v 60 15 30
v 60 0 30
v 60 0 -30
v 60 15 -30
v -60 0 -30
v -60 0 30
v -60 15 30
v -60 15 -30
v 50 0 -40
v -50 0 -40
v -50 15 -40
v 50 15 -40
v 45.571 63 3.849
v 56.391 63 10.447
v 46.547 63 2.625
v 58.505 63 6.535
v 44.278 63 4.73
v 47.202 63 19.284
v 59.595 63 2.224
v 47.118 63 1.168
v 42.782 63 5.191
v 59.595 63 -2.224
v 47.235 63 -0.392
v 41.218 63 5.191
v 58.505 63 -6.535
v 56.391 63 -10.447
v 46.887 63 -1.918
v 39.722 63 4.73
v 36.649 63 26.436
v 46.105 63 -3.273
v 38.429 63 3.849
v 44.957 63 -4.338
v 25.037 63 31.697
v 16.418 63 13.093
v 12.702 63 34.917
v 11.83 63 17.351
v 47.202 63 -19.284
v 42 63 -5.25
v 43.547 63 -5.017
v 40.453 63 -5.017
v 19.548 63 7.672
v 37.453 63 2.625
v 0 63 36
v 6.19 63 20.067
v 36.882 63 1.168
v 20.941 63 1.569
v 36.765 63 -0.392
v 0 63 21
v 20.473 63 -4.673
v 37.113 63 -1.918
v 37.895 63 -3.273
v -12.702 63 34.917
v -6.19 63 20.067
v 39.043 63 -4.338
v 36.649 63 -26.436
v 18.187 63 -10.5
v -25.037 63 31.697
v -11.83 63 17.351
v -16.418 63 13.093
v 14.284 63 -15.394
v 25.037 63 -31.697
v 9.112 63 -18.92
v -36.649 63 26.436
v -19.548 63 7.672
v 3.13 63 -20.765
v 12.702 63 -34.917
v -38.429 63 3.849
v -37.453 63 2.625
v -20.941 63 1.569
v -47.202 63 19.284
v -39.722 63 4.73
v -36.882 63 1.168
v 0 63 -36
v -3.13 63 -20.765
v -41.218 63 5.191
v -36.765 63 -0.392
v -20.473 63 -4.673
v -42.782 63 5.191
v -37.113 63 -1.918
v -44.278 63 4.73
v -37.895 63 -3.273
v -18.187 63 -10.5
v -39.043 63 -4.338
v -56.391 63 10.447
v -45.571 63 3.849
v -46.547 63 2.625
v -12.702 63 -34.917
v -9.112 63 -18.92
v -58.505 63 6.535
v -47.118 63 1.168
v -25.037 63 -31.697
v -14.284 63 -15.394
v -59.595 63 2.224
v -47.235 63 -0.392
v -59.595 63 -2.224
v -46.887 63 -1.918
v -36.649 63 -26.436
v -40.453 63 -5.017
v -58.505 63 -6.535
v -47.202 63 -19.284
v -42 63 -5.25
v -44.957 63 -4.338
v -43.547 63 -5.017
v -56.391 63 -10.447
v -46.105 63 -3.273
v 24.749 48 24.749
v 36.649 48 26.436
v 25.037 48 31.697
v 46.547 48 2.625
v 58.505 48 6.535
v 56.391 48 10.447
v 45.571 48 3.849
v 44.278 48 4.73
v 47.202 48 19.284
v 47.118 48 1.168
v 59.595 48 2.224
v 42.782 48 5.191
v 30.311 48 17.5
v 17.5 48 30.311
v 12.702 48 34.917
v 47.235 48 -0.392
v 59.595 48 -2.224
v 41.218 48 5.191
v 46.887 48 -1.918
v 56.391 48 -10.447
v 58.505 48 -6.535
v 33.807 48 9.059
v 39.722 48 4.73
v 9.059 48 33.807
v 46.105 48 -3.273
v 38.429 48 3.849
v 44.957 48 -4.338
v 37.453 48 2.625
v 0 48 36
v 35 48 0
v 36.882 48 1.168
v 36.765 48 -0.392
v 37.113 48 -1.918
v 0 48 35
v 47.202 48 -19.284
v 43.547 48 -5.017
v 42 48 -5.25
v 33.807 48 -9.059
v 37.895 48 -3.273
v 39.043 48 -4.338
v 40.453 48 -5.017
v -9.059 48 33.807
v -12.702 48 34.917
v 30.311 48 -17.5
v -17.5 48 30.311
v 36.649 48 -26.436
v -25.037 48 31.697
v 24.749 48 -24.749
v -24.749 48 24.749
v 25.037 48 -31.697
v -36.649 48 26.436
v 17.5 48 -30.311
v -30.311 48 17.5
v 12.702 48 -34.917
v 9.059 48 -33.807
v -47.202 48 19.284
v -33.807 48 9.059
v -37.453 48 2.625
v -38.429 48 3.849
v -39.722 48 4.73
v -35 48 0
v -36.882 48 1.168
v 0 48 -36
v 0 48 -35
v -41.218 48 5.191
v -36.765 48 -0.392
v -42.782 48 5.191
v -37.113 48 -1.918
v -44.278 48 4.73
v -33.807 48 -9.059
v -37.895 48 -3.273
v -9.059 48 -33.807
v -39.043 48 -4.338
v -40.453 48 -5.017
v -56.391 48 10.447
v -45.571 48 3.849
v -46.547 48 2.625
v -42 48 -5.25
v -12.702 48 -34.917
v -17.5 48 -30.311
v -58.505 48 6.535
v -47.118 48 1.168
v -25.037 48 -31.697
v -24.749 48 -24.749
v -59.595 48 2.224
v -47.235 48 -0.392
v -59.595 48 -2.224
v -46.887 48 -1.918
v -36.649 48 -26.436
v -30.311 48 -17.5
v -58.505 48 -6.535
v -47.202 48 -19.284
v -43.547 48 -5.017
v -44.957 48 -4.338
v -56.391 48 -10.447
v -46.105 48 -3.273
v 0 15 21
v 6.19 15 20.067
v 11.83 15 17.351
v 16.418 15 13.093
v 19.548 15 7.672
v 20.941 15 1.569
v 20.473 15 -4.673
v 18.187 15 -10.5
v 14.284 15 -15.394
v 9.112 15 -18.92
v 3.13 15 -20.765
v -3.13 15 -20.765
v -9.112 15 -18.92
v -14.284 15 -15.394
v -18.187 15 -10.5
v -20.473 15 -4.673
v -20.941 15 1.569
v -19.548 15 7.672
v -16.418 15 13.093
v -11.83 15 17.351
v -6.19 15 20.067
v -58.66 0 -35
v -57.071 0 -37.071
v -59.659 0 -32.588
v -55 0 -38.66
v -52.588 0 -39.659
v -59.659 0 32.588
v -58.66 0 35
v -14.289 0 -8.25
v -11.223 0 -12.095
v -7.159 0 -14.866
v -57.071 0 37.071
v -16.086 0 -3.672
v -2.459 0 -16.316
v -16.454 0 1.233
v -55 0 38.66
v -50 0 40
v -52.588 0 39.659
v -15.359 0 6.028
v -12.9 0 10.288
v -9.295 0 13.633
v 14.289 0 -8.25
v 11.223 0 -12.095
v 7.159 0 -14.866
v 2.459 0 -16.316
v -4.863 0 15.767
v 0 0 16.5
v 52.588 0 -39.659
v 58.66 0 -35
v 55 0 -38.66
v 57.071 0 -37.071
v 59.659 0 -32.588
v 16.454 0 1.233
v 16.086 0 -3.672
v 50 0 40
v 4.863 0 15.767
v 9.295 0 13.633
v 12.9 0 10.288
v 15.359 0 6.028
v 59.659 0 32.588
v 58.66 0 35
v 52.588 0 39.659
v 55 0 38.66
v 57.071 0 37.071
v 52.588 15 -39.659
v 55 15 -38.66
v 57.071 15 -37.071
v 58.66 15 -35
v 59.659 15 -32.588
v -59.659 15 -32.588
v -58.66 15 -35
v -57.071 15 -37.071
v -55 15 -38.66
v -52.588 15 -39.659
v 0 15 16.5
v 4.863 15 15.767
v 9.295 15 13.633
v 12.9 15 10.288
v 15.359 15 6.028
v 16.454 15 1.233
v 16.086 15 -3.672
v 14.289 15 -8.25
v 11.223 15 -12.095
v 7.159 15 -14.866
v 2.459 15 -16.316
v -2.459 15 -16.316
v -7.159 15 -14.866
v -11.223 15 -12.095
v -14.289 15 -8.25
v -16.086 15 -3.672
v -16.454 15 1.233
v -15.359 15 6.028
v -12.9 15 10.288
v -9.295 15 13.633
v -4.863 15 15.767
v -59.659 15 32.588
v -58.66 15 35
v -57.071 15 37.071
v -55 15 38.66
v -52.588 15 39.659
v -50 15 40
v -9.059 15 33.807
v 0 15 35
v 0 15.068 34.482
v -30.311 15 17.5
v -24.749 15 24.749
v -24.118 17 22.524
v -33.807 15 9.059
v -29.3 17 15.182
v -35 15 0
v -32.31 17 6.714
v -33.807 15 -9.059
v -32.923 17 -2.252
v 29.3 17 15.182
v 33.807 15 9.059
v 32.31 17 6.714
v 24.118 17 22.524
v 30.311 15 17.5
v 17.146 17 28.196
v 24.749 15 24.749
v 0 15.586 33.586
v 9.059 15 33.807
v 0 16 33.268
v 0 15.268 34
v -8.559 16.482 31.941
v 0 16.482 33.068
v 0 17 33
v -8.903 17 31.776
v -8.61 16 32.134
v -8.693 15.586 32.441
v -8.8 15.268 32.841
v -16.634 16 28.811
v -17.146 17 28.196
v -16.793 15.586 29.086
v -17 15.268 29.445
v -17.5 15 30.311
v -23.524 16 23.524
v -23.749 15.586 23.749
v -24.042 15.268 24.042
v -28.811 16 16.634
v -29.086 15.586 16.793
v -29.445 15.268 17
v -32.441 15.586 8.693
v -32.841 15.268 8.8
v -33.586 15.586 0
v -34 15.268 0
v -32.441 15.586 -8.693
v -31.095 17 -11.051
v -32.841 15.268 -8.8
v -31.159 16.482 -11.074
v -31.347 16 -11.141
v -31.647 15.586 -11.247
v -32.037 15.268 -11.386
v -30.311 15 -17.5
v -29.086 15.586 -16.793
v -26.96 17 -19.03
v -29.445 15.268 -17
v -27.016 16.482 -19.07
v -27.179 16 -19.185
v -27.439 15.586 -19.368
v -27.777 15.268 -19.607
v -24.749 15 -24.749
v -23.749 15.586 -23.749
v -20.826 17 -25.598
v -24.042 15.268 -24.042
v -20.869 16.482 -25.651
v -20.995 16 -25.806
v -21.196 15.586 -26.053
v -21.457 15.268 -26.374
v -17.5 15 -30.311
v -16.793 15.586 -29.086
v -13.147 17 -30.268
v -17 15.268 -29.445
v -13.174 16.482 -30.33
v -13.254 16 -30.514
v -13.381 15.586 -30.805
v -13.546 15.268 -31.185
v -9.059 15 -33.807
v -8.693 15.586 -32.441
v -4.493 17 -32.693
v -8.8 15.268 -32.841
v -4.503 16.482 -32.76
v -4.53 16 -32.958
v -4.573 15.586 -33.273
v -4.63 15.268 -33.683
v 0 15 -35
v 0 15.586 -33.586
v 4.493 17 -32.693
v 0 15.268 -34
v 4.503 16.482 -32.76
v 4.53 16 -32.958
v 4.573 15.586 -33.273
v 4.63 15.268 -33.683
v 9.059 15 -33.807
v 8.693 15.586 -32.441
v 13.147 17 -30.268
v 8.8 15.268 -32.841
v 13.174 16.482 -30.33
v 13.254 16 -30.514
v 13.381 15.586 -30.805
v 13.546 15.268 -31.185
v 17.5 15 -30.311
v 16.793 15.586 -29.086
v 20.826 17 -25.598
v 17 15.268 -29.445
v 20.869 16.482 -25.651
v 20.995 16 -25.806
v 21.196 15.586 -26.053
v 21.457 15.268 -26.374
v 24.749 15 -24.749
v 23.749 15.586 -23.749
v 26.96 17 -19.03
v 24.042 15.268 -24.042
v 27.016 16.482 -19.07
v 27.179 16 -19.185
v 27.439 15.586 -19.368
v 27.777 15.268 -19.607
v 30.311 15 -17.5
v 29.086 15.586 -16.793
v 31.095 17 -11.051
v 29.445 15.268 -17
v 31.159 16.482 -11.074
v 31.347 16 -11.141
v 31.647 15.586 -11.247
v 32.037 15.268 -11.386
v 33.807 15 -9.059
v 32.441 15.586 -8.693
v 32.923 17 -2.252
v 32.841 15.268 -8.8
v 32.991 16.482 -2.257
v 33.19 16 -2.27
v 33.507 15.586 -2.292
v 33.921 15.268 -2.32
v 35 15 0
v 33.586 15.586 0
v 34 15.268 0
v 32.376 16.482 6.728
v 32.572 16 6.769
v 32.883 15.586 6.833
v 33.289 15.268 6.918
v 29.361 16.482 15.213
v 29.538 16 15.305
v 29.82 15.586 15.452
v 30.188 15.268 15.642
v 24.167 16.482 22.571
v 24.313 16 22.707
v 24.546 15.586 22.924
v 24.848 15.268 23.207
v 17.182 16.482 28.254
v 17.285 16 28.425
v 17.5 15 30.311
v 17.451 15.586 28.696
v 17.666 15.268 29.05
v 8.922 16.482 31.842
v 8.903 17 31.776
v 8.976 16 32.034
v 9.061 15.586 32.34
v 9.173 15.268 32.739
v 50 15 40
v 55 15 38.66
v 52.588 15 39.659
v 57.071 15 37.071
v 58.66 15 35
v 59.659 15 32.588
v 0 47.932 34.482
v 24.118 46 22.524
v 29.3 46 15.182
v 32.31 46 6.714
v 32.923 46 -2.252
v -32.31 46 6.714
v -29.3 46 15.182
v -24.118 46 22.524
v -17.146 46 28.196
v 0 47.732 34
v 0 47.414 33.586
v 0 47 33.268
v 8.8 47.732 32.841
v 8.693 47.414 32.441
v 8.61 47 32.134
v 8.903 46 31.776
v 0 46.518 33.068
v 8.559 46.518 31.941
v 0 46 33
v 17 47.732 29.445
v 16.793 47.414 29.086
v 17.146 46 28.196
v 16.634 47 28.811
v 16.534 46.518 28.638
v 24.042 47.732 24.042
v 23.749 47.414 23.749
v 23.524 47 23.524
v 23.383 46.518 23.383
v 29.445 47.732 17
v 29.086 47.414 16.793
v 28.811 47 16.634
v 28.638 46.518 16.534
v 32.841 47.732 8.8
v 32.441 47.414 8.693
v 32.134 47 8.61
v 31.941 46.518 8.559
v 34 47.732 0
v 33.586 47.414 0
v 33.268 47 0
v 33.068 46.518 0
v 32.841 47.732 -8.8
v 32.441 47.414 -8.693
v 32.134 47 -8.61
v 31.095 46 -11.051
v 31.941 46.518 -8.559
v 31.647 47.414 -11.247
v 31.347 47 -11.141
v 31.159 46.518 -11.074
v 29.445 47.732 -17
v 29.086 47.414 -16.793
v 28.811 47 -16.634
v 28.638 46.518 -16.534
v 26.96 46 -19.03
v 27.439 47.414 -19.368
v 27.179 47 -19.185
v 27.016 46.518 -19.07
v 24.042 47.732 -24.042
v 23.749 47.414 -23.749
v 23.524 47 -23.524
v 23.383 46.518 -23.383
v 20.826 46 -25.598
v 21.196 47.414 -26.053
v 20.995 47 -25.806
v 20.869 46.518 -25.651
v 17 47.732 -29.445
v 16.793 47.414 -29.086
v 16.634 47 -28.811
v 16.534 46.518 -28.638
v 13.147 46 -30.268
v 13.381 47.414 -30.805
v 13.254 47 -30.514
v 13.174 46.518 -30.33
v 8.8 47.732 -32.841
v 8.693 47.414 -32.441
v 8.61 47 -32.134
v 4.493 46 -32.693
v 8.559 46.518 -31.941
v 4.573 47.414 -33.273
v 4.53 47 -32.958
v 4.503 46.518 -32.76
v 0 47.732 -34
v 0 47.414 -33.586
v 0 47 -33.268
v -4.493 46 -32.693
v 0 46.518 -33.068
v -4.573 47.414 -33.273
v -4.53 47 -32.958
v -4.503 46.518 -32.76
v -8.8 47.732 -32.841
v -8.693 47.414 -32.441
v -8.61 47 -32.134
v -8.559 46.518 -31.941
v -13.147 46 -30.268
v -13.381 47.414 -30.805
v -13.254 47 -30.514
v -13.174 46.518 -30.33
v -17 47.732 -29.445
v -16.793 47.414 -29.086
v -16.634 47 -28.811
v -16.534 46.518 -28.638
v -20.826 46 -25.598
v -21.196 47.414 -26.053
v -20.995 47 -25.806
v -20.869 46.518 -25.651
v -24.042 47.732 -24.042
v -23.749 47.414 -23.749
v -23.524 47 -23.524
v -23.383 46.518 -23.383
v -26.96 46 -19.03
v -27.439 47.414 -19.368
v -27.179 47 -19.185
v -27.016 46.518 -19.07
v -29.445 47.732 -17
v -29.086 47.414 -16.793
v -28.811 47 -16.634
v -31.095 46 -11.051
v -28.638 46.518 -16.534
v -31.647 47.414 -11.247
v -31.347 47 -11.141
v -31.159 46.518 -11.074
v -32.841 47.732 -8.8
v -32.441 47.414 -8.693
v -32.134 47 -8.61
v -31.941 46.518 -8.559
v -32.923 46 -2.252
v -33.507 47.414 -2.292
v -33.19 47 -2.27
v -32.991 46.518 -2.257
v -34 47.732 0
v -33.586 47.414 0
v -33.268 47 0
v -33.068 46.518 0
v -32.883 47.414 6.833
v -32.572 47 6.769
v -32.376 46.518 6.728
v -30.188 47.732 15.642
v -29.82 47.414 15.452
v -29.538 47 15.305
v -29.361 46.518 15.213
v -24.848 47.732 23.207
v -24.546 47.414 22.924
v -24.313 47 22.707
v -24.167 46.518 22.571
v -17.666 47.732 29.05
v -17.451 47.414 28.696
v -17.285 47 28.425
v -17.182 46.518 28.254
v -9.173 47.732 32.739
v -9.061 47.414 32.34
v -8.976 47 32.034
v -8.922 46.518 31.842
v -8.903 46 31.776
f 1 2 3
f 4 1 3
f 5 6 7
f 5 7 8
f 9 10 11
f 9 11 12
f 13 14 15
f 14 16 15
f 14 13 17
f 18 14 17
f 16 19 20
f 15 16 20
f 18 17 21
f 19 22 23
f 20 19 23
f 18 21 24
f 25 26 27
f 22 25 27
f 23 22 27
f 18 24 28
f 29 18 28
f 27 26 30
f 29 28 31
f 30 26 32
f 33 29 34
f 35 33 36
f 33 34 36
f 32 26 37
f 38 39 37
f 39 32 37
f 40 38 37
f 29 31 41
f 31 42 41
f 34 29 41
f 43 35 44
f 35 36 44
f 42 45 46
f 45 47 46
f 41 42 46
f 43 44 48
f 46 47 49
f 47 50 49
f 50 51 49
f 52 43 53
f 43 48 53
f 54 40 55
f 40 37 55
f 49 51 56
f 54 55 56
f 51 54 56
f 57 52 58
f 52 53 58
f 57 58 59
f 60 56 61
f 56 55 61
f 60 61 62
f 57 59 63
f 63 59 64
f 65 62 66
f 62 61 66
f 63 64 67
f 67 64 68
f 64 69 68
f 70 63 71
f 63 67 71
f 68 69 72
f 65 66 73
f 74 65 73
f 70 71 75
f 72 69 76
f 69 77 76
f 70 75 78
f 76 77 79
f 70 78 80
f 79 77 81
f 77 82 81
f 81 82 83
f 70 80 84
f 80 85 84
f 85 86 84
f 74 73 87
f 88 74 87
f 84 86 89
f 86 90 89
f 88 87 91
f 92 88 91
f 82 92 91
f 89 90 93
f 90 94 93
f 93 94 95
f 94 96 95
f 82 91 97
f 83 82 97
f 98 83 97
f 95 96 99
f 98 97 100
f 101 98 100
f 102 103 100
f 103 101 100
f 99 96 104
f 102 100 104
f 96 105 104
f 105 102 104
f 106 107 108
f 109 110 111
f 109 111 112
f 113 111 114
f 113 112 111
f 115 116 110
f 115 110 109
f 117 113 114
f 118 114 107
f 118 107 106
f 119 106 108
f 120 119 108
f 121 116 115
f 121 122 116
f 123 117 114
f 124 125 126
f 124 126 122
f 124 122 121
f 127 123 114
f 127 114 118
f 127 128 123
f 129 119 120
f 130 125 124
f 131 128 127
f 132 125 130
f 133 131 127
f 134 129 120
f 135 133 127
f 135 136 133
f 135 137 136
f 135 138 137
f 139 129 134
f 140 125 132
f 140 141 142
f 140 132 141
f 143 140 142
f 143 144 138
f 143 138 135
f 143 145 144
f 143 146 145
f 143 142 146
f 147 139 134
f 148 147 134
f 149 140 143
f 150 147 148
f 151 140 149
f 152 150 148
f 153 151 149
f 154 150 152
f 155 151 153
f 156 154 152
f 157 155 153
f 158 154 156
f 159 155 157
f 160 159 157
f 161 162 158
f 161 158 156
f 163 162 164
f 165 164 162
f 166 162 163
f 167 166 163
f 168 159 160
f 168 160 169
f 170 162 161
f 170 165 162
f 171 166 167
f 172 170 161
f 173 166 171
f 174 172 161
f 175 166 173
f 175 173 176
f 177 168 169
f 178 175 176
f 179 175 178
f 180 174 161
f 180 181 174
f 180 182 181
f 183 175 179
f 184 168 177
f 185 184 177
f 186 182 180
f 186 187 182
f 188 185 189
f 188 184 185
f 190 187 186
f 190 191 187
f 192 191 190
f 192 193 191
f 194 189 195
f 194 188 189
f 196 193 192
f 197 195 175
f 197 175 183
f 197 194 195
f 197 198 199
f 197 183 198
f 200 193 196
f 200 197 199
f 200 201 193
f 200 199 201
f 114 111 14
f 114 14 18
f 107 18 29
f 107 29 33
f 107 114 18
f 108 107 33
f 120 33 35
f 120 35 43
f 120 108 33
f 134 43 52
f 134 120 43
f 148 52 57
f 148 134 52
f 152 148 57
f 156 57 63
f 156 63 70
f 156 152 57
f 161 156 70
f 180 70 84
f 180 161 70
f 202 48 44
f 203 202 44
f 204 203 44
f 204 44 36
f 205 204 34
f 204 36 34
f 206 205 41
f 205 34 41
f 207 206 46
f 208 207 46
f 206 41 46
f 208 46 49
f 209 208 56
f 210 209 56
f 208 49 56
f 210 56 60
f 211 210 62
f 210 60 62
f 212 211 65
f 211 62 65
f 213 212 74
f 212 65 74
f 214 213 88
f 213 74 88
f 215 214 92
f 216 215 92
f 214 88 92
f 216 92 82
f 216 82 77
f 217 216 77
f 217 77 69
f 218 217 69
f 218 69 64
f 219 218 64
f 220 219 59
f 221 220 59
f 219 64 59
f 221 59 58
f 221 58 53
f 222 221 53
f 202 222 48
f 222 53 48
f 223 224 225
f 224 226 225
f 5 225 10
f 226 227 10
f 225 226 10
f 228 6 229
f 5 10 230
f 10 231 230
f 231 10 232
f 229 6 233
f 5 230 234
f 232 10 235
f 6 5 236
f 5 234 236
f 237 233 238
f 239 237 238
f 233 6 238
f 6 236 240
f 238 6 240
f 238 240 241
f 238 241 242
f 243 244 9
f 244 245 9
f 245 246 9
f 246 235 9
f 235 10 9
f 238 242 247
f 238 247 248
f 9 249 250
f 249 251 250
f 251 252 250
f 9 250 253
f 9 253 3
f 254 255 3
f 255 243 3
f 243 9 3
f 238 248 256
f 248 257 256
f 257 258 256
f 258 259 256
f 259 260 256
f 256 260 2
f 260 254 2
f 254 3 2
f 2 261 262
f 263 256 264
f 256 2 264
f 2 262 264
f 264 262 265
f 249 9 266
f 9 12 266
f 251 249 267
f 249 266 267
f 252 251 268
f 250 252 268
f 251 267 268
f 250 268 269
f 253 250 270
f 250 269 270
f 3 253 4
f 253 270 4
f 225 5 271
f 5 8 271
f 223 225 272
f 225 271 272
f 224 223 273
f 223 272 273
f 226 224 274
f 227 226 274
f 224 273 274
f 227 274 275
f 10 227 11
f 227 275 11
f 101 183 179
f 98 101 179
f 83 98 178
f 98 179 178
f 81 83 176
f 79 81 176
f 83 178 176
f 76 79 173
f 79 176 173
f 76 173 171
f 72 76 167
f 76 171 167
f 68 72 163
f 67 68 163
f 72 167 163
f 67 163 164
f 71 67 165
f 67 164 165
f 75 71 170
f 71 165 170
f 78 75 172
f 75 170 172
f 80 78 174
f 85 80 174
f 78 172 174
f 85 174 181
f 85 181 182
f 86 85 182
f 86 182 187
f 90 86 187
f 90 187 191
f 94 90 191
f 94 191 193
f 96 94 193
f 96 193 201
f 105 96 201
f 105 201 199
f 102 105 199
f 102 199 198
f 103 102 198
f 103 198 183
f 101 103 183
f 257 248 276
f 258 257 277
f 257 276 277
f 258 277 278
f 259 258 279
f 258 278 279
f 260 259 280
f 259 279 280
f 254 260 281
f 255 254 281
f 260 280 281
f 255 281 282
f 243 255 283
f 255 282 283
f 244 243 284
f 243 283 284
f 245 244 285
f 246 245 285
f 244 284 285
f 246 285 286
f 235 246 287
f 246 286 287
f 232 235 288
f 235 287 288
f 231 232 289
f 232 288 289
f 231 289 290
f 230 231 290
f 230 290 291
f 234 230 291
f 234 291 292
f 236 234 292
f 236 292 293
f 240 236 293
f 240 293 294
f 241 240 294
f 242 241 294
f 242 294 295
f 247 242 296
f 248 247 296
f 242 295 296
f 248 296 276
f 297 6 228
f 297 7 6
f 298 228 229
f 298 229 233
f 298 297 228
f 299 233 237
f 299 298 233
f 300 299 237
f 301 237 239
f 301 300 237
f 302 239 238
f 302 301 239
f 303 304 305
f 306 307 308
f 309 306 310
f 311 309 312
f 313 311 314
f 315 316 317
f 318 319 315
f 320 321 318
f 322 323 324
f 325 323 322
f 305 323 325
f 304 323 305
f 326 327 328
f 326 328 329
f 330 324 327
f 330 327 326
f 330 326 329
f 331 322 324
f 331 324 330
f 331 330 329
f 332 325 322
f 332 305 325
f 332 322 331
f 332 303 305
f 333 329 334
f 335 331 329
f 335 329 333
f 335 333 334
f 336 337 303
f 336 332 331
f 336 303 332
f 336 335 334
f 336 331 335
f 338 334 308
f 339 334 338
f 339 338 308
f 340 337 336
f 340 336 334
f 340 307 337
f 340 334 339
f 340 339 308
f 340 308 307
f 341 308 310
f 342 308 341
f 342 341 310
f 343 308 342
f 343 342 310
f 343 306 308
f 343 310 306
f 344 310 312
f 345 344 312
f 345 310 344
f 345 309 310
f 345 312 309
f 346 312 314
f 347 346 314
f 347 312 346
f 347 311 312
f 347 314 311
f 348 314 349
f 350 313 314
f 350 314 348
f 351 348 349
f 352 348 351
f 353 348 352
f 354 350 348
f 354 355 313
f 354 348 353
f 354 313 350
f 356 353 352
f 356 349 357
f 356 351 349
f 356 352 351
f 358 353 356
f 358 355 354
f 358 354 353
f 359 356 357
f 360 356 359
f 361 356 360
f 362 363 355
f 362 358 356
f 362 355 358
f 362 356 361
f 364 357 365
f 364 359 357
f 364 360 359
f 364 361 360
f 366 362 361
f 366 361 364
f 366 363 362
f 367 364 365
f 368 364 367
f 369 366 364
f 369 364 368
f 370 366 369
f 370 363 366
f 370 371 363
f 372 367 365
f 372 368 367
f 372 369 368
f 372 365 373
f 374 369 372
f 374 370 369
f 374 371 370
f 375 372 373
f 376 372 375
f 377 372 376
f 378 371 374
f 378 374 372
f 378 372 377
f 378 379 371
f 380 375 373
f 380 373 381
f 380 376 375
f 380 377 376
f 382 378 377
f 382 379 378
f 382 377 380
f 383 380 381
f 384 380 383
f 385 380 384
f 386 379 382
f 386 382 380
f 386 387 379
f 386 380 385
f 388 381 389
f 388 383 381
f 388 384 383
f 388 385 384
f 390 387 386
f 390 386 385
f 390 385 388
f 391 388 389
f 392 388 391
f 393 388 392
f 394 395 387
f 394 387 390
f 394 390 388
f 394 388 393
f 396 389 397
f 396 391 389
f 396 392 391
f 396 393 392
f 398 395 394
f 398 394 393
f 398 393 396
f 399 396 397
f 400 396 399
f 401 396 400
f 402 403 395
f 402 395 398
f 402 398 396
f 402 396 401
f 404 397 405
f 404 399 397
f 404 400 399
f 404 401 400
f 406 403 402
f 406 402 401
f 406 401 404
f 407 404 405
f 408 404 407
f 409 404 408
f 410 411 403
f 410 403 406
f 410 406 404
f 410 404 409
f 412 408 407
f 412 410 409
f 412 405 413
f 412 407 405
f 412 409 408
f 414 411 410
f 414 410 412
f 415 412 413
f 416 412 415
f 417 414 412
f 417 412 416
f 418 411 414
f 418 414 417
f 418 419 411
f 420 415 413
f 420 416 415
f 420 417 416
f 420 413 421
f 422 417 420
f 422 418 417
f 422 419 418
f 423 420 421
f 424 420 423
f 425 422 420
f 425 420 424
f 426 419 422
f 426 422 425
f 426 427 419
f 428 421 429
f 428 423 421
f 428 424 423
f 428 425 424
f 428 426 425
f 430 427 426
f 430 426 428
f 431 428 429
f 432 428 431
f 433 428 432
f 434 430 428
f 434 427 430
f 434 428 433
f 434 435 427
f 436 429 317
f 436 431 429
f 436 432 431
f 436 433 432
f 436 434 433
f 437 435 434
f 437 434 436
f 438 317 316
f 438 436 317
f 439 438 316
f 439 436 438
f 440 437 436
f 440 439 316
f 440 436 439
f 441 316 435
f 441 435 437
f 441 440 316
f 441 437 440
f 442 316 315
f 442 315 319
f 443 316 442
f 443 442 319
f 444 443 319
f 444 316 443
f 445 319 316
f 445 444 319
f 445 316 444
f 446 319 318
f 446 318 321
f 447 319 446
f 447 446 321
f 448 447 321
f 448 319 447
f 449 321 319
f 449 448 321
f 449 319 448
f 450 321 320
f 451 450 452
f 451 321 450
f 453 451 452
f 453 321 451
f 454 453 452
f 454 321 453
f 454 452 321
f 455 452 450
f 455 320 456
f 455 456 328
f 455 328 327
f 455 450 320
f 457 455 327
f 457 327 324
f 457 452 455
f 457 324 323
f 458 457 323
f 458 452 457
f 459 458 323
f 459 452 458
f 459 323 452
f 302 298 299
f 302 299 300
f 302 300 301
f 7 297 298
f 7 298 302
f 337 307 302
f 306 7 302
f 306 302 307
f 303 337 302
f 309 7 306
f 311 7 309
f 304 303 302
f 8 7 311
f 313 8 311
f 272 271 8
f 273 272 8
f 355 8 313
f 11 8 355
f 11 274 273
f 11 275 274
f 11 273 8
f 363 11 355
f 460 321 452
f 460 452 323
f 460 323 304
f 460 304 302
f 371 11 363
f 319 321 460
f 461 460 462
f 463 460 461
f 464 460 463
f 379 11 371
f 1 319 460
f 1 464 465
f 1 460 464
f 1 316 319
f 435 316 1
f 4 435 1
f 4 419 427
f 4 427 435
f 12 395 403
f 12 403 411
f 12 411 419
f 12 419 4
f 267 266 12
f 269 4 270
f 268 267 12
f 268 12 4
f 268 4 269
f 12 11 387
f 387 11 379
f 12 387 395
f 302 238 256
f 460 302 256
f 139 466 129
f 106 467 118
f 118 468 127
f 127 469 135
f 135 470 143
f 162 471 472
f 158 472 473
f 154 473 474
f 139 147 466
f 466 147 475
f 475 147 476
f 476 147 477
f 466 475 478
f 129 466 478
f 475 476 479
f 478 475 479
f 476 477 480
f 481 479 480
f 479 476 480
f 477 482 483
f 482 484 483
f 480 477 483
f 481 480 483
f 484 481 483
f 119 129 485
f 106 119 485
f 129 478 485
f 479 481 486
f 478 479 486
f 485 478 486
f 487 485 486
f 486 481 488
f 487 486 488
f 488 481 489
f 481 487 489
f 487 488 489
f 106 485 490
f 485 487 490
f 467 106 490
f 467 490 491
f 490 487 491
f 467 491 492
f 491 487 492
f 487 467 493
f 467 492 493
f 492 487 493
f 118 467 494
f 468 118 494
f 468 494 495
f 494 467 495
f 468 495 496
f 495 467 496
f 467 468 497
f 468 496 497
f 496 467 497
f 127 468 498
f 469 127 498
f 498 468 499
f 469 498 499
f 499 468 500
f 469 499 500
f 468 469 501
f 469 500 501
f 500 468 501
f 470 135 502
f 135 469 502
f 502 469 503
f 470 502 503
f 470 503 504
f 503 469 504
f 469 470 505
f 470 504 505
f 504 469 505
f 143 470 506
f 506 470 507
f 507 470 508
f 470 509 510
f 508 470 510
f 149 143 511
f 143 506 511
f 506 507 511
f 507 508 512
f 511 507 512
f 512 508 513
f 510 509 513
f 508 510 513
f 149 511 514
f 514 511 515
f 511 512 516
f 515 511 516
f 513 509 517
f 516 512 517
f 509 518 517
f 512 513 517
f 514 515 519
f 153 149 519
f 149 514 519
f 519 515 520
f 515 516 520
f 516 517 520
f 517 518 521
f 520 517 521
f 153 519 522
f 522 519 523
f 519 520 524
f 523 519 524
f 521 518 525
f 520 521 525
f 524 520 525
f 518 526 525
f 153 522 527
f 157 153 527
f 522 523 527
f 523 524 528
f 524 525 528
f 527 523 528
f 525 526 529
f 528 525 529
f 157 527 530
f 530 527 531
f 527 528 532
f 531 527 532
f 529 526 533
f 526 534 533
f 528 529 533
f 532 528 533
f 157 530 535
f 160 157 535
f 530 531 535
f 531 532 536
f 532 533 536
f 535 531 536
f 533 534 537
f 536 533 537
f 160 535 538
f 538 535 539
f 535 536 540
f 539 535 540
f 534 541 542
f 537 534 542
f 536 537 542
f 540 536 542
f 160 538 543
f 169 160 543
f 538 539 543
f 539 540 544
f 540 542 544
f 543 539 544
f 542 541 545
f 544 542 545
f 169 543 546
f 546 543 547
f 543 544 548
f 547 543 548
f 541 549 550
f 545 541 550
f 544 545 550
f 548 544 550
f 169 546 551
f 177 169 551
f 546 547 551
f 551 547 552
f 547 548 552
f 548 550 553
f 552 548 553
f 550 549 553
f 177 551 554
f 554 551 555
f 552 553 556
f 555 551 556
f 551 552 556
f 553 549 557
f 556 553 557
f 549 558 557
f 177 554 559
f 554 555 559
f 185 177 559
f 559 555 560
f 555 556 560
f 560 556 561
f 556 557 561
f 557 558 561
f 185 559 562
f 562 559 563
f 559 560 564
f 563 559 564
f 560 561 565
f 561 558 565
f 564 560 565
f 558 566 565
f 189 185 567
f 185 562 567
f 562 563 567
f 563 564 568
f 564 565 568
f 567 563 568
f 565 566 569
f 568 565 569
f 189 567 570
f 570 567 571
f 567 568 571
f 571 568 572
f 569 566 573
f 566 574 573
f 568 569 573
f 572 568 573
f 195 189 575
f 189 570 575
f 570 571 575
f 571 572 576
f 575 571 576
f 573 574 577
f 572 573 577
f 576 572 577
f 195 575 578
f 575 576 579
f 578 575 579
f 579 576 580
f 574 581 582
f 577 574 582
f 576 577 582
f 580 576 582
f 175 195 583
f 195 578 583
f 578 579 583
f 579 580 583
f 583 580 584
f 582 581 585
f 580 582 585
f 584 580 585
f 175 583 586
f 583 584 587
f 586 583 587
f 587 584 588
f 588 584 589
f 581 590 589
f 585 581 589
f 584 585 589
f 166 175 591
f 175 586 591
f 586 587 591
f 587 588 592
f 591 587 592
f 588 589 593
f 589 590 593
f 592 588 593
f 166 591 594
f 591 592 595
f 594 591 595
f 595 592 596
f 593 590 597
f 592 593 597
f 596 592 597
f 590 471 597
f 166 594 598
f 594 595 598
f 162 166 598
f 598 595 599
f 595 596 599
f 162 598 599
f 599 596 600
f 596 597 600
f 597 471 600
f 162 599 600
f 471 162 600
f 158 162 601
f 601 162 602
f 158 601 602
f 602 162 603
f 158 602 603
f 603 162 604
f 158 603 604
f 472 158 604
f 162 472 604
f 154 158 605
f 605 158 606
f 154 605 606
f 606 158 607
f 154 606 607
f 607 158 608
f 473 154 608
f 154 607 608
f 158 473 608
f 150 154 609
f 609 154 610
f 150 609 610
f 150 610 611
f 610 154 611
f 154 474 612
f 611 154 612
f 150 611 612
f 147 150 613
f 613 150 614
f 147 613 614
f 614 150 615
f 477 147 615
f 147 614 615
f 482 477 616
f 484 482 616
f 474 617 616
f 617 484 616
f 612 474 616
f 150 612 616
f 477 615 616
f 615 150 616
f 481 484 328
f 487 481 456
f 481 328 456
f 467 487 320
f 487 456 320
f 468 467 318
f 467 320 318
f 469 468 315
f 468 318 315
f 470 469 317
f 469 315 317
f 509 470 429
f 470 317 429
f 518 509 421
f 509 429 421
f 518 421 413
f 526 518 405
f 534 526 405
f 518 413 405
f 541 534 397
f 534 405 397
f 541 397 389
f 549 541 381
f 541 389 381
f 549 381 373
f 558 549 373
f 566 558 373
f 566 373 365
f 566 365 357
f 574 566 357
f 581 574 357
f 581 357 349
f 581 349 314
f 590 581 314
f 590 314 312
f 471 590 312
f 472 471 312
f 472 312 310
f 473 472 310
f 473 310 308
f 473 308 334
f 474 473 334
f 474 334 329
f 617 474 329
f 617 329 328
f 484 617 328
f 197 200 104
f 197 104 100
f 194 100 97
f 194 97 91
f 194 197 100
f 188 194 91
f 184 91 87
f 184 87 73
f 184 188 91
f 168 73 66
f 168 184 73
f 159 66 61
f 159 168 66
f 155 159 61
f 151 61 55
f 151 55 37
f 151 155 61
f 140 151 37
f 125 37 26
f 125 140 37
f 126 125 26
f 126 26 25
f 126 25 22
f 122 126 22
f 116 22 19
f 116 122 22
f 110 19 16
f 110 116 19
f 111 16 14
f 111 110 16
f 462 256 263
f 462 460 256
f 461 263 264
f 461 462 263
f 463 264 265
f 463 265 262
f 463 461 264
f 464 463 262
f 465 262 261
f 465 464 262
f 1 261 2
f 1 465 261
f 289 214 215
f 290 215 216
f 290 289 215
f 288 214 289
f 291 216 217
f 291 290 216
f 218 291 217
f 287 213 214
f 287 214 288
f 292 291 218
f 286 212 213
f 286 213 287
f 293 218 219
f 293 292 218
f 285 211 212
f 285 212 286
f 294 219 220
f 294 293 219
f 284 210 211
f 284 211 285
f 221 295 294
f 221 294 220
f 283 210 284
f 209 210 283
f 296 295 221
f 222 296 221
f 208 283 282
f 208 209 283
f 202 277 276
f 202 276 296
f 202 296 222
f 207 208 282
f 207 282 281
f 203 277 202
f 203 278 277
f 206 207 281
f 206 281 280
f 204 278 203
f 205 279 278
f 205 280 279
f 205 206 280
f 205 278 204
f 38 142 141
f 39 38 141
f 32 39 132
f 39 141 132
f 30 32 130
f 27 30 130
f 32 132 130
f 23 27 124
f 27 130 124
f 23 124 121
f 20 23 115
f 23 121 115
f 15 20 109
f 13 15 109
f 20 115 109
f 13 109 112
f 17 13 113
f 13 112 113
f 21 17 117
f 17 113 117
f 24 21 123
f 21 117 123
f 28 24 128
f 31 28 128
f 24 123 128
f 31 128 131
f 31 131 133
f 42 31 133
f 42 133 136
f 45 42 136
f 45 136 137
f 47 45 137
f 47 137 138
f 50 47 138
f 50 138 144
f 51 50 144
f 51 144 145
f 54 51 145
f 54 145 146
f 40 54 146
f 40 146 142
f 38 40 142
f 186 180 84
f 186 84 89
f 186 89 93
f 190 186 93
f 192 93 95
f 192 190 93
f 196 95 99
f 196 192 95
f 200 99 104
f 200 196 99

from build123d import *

# Parameters (mm, degrees)
SKETCH1_W                  = 120
SKETCH1_H                  = 80
BOSS_EXTRUDE1_DEPTH        = 15
SKETCH2_R                  = 33
BOSS_EXTRUDE2_DEPTH        = 48
BOSS_EXTRUDE3_DEPTH        = 15
SKETCH10_R                 = 21
CUT_EXTRUDE1_DEPTH         = 48
SKETCH11_R                 = 16.5
CUT_EXTRUDE2_DEPTH         = 15
M12X1_5_TAPPED_HOLE1_D     = 10.5
M12X1_5_TAPPED_HOLE1_DEPTH = 15
FILLET2_R                  = 2
FILLET3_R                  = 10


with BuildPart() as part:
    # Sketch1 → Boss-Extrude1 (new body)
    with BuildSketch(Plane(origin=(0, 0, 0), x_dir=(1, 0, 0), z_dir=(0, 1, 0))):
        Rectangle(SKETCH1_W, SKETCH1_H)
    extrude(amount=BOSS_EXTRUDE1_DEPTH)

    # Sketch2 → Boss-Extrude2 (add)
    with BuildSketch(Plane(origin=(0, 0, 0), x_dir=(1, 0, 0), z_dir=(0, 1, 0))):
        with Locations(Location((0, 0, 0), (0, 0, 270))):
            Circle(SKETCH2_R)
    extrude(amount=BOSS_EXTRUDE2_DEPTH)

    # Sketch3 → Boss-Extrude3 (add)
    with BuildSketch(Plane(origin=(0, 48, 0), x_dir=(1, 0, 0), z_dir=(0, 1, 0))):
        with BuildLine():
            ThreePointArc((-56.391046334, 10.447445772), (0, 36), (56.391046334, 10.447445772))
            ThreePointArc((56.391046334, 10.447445772), (59.733253975, 0), (56.391046334, -10.447445772))
            ThreePointArc((56.391046334, -10.447445772), (0, -36), (-56.391046334, -10.447445772))
            ThreePointArc((-56.391046334, -10.447445772), (-59.733253975, 0), (-56.391046334, 10.447445772))
        make_face()
    extrude(amount=BOSS_EXTRUDE3_DEPTH)

    # Sketch10 → Cut-Extrude1 (cut)
    with BuildSketch(Plane(origin=(0, 63, 0), x_dir=(1, 0, 0), z_dir=(0, 1, 0))):
        with Locations(Location((0, 0, 0), (0, 0, 270))):
            Circle(SKETCH10_R)
    extrude(amount=-CUT_EXTRUDE1_DEPTH, mode=Mode.SUBTRACT)

    # Sketch11 → Cut-Extrude2 (cut)
    with BuildSketch(Plane(origin=(0, 15, 0), x_dir=(1, 0, 0), z_dir=(0, 1, 0))):
        with Locations(Location((0, 0, 0), (0, 0, 270))):
            Circle(SKETCH11_R)
    extrude(amount=-CUT_EXTRUDE2_DEPTH, mode=Mode.SUBTRACT)

    # M12x1.5 Tapped Hole1
    with Locations(Plane(origin=(-42, 63, 0), x_dir=(0, 0, 1), z_dir=(0, 1, 0))):
        with Locations((0, 0), (0, 84)):
            Hole(M12X1_5_TAPPED_HOLE1_D / 2, depth=M12X1_5_TAPPED_HOLE1_DEPTH)

    # Fillet2
    fillet2_edges = [part.edges().sort_by_distance(p)[0] for p in [
        (0, 15, -33),
        (0, 48, -33),
    ]]
    fillet(fillet2_edges, radius=FILLET2_R)

    # Fillet3
    fillet3_edges = [part.edges().sort_by_distance(p)[0] for p in [
        (60, 7.5, 40),
        (-60, 7.5, 40),
        (-60, 7.5, -40),
        (60, 7.5, -40),
    ]]
    fillet(fillet3_edges, radius=FILLET3_R)


solid = part.part
